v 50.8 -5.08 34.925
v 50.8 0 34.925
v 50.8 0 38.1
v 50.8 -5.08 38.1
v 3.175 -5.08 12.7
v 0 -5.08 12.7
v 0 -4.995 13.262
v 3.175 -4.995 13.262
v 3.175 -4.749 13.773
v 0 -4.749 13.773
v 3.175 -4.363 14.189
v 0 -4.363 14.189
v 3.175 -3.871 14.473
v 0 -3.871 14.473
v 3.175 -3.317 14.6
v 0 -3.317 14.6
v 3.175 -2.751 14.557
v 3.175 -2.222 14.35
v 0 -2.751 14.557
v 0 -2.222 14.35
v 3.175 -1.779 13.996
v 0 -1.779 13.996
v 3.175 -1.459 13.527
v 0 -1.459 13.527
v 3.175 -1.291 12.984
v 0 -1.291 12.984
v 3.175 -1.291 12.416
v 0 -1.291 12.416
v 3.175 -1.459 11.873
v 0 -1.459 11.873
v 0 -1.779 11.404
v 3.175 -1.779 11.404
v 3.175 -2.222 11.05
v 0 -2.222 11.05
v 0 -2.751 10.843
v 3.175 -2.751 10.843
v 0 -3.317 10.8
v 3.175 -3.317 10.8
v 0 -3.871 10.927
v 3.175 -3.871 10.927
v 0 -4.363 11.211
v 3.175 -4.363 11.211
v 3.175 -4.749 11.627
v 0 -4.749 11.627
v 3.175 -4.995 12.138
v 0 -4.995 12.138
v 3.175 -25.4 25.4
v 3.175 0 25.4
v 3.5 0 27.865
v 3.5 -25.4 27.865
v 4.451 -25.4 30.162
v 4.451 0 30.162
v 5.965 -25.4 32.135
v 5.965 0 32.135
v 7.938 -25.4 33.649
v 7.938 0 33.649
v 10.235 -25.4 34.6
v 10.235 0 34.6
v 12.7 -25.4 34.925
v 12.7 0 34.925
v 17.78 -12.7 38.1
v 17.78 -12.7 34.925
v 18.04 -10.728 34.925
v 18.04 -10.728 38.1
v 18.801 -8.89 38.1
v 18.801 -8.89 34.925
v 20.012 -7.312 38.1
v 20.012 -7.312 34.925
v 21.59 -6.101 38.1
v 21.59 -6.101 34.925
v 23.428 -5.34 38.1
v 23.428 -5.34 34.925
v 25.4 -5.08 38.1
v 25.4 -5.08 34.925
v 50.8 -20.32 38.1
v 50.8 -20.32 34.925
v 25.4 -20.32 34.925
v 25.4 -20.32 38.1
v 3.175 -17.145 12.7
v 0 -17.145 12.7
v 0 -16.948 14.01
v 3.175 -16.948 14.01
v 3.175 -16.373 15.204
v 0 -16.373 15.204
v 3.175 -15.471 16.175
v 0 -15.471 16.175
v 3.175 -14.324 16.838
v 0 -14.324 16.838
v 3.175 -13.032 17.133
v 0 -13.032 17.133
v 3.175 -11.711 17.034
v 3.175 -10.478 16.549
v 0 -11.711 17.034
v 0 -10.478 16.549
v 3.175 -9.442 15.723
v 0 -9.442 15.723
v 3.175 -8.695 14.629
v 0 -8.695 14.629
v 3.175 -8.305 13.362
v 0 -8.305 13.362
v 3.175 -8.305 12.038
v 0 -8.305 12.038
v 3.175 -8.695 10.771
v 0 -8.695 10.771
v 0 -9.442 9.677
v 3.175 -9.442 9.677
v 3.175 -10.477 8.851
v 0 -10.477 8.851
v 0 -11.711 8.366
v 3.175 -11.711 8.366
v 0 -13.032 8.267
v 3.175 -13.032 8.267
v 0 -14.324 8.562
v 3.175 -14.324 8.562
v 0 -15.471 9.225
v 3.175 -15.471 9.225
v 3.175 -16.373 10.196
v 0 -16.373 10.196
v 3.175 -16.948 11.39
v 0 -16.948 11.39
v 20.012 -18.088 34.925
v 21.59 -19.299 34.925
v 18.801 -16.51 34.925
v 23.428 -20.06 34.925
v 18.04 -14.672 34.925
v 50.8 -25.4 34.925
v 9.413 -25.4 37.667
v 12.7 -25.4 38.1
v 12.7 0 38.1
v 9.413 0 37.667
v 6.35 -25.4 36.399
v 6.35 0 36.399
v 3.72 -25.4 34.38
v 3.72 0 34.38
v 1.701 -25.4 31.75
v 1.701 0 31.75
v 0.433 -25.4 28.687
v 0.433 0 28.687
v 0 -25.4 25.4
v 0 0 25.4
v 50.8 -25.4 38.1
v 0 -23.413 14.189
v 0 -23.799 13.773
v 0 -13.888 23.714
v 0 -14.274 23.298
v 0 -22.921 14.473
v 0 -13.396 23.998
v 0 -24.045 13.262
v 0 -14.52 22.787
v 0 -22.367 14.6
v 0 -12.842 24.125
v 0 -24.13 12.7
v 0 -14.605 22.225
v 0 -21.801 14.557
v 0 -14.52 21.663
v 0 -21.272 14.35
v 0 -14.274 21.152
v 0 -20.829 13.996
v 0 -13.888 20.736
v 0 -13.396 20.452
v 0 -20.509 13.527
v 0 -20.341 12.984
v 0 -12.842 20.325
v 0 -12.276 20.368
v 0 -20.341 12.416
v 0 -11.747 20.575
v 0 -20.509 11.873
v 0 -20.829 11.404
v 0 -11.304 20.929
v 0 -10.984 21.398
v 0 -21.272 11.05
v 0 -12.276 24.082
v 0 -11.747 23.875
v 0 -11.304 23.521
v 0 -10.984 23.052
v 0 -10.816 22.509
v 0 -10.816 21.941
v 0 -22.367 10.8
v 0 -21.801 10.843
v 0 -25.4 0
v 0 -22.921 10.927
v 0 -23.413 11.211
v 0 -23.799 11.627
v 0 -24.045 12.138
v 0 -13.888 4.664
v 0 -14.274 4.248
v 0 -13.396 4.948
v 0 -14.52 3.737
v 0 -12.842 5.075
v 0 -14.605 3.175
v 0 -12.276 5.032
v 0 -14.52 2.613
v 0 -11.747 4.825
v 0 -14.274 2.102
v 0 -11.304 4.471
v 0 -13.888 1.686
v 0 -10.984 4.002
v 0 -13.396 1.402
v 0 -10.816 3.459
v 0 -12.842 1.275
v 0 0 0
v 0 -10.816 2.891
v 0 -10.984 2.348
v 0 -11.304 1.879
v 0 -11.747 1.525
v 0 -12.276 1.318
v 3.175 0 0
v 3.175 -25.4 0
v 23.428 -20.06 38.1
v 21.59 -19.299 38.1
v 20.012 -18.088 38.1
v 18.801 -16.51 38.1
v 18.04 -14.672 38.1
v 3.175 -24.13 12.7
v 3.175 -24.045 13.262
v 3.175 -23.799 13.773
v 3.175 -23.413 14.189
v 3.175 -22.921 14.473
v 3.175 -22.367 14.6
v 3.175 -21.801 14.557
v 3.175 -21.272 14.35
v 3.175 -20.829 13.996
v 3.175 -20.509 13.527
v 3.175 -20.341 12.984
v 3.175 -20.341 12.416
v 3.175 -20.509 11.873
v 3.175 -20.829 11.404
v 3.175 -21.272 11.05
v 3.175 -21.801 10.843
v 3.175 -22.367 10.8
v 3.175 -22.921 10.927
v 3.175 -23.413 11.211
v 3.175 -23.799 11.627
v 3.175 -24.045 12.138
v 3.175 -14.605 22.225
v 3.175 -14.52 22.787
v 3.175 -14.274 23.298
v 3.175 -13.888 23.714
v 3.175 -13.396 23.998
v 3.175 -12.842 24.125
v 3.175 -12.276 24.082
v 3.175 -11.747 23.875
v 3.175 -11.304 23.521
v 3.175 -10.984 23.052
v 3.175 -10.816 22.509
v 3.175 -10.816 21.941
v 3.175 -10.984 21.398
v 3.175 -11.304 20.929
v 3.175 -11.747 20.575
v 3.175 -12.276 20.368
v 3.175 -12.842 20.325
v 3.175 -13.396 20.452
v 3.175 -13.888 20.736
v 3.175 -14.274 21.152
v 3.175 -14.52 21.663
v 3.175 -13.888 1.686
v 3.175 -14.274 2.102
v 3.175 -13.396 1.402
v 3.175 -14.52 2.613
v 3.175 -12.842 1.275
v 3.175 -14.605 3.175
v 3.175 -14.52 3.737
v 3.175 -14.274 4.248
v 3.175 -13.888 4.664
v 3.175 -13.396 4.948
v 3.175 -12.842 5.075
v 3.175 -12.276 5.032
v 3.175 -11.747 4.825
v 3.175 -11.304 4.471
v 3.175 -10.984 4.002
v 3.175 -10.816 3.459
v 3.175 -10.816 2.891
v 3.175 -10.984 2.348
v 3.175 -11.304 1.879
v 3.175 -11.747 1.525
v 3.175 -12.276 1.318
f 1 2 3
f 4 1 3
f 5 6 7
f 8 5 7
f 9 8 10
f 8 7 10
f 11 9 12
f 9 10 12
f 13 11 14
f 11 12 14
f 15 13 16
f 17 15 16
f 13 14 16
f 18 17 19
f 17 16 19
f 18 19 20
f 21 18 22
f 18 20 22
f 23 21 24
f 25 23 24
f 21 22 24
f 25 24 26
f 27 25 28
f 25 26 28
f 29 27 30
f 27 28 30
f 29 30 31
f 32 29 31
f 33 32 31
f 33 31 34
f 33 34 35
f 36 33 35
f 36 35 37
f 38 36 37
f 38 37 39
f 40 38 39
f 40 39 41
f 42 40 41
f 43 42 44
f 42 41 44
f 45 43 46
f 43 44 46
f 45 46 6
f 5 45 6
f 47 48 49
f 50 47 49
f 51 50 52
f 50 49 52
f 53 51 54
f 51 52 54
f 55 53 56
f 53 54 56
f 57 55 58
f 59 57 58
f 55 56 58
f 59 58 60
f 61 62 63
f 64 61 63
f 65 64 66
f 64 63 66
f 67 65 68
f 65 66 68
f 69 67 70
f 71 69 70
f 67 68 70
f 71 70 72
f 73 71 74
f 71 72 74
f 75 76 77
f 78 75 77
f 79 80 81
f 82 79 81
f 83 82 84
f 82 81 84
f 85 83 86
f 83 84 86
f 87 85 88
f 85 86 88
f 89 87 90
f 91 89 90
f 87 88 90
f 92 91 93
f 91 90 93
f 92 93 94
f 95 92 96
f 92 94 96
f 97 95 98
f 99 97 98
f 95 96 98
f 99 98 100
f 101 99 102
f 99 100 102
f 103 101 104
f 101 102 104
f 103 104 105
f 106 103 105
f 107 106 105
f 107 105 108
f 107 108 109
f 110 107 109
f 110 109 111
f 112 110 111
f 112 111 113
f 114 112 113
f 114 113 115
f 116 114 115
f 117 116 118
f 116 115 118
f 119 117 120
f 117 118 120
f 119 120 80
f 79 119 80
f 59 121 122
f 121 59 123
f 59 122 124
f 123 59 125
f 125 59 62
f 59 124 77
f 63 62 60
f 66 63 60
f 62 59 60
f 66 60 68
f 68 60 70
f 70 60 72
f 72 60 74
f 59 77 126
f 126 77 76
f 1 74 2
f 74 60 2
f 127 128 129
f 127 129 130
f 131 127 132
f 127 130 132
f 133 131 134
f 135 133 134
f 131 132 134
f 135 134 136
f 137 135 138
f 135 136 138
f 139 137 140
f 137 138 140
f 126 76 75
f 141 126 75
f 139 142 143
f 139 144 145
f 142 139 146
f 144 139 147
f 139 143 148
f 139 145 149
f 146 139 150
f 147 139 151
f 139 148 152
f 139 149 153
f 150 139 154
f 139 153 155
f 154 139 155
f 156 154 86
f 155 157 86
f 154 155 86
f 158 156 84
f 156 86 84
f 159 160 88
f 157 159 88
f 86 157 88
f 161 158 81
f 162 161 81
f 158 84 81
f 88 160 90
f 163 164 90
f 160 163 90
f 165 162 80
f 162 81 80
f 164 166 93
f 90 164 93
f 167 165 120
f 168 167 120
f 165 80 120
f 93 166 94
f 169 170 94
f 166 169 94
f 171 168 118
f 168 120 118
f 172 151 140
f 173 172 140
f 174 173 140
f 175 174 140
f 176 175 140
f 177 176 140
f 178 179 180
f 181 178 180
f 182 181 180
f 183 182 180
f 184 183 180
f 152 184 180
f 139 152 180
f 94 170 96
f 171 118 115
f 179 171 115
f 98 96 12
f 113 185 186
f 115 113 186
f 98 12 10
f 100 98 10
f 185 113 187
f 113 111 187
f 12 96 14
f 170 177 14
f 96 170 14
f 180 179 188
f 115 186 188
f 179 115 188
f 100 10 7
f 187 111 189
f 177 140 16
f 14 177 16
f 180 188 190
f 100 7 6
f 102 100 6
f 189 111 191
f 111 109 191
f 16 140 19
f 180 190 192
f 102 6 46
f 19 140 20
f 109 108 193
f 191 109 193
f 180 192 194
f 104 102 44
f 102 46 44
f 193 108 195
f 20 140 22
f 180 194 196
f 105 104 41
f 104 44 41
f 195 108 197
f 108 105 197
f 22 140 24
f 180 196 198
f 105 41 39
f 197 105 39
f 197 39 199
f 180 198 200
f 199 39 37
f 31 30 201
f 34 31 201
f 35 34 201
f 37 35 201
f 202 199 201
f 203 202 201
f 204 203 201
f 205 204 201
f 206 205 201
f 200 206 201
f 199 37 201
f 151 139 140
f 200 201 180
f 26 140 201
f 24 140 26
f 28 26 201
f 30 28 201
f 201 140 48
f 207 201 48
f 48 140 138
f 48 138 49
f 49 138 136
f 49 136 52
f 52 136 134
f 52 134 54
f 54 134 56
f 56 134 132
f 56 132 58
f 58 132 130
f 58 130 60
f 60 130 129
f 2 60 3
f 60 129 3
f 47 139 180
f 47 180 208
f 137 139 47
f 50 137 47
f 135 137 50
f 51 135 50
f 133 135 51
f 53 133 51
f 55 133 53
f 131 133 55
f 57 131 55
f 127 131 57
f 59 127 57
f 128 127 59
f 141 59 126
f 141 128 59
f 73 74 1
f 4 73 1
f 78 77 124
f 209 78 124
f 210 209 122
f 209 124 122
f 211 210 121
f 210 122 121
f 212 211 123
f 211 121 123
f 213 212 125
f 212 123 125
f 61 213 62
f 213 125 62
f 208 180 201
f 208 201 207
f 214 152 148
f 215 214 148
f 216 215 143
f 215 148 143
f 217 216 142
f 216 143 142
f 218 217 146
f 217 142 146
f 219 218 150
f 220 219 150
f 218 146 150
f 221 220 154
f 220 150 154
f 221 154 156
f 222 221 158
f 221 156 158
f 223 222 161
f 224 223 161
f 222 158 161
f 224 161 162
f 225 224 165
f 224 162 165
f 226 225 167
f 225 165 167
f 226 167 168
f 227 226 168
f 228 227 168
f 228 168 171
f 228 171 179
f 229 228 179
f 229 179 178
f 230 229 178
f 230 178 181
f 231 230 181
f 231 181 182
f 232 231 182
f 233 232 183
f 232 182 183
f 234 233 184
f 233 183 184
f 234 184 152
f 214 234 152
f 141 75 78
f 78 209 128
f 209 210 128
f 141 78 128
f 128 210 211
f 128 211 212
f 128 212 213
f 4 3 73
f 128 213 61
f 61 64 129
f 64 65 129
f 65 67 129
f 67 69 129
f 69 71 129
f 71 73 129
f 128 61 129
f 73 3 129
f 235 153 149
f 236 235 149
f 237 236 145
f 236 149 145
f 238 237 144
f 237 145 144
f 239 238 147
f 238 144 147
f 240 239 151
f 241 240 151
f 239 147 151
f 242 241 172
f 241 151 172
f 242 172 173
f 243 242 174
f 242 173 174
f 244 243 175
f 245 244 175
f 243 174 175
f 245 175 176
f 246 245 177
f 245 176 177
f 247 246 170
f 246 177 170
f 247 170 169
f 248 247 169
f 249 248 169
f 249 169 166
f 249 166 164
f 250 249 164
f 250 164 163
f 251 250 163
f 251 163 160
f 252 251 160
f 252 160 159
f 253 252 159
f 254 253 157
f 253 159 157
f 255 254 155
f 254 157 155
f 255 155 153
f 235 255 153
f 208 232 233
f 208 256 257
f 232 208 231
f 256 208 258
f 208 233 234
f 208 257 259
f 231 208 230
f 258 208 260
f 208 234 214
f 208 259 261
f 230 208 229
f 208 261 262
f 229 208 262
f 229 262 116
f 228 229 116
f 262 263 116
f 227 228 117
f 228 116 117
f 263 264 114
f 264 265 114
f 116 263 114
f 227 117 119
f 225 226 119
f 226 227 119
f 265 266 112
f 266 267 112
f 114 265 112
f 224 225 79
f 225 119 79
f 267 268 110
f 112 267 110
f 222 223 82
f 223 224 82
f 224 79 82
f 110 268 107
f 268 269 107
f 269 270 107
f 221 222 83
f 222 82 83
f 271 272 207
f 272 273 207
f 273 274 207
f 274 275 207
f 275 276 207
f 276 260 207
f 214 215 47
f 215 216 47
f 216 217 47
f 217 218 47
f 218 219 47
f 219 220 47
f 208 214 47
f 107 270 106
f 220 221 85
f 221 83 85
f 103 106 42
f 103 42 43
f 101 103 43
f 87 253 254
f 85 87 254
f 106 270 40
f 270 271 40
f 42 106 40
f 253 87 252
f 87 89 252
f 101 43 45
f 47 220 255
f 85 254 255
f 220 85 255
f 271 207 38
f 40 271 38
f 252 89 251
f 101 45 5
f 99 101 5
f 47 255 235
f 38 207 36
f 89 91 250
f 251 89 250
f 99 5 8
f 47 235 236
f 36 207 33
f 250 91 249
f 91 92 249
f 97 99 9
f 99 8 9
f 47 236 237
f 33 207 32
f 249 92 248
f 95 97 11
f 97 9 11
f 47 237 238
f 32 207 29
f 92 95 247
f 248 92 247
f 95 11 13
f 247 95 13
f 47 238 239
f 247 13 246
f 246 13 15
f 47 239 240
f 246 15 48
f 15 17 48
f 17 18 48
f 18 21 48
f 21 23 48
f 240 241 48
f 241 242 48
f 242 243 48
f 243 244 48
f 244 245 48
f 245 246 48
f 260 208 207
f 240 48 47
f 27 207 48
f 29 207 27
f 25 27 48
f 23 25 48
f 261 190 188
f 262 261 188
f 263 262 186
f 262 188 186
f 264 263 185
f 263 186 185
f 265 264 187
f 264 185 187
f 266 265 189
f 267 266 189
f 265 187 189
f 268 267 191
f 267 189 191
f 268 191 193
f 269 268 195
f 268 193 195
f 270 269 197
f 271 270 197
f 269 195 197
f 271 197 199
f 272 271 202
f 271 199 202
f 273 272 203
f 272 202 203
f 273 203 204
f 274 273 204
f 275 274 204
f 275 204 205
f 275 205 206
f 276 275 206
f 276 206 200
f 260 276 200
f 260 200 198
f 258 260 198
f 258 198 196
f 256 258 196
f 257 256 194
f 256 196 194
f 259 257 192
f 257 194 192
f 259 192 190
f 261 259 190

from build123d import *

# Parameters (mm, degrees)
F1_DEPTH = 25.4
F3_DEPTH = 3.175
F4_R     = 4.445
F4_R_2   = 1.905
F5_DEPTH = 3.175


with BuildPart() as f1:
    # F0 (on Front) → F1 (new body)
    with BuildSketch(Plane.XZ):
        with BuildLine():
            Line((0, 25.4), (0, 0))
            Line((0, 0), (3.175, 0))
            Line((3.175, 0), (3.175, 25.4))
            ThreePointArc((3.175, 25.4), (5.964808, 32.135192), (12.7, 34.925))
            Line((12.7, 34.925), (50.8, 34.925))
            Line((50.8, 34.925), (50.8, 38.1))
            Line((50.8, 38.1), (12.7, 38.1))
            ThreePointArc((12.7, 38.1), (3.719744, 34.380256), (0, 25.4))
        make_face()
    extrude(amount=F1_DEPTH)

    # F2 (on face) → F3 (cut, through all)
    with BuildSketch(Plane(origin=(0, 0, 34.925), x_dir=(1, 0, 0), z_dir=(0, 0, -1))):
        with BuildLine():
            Line((50.8, 5.08), (50.8, 20.32))
            Line((50.8, 20.32), (25.4, 20.32))
            ThreePointArc((25.4, 20.32), (20.011846, 18.088154), (17.78, 12.7))
            ThreePointArc((17.78, 12.7), (20.011846, 7.311846), (25.4, 5.08))
            Line((25.4, 5.08), (50.8, 5.08))
        make_face()
    extrude(amount=-F3_DEPTH, mode=Mode.SUBTRACT)

    # F4 (on face) → F5 (cut, through all)
    with BuildSketch(Plane(origin=(0, 0, 0), x_dir=(0, -1, 0), z_dir=(-1, 0, 0))):
        with Locations((12.7, 12.7)):
            Circle(F4_R)
        with Locations((22.225, 12.7)):
            Circle(F4_R_2)
        with Locations((12.7, 3.175)):
            Circle(F4_R_2)
        with Locations((3.175, 12.7)):
            Circle(F4_R_2)
        with Locations((12.7, 22.225)):
            Circle(F4_R_2)
    extrude(amount=-F5_DEPTH, mode=Mode.SUBTRACT)


solid = f1.part
